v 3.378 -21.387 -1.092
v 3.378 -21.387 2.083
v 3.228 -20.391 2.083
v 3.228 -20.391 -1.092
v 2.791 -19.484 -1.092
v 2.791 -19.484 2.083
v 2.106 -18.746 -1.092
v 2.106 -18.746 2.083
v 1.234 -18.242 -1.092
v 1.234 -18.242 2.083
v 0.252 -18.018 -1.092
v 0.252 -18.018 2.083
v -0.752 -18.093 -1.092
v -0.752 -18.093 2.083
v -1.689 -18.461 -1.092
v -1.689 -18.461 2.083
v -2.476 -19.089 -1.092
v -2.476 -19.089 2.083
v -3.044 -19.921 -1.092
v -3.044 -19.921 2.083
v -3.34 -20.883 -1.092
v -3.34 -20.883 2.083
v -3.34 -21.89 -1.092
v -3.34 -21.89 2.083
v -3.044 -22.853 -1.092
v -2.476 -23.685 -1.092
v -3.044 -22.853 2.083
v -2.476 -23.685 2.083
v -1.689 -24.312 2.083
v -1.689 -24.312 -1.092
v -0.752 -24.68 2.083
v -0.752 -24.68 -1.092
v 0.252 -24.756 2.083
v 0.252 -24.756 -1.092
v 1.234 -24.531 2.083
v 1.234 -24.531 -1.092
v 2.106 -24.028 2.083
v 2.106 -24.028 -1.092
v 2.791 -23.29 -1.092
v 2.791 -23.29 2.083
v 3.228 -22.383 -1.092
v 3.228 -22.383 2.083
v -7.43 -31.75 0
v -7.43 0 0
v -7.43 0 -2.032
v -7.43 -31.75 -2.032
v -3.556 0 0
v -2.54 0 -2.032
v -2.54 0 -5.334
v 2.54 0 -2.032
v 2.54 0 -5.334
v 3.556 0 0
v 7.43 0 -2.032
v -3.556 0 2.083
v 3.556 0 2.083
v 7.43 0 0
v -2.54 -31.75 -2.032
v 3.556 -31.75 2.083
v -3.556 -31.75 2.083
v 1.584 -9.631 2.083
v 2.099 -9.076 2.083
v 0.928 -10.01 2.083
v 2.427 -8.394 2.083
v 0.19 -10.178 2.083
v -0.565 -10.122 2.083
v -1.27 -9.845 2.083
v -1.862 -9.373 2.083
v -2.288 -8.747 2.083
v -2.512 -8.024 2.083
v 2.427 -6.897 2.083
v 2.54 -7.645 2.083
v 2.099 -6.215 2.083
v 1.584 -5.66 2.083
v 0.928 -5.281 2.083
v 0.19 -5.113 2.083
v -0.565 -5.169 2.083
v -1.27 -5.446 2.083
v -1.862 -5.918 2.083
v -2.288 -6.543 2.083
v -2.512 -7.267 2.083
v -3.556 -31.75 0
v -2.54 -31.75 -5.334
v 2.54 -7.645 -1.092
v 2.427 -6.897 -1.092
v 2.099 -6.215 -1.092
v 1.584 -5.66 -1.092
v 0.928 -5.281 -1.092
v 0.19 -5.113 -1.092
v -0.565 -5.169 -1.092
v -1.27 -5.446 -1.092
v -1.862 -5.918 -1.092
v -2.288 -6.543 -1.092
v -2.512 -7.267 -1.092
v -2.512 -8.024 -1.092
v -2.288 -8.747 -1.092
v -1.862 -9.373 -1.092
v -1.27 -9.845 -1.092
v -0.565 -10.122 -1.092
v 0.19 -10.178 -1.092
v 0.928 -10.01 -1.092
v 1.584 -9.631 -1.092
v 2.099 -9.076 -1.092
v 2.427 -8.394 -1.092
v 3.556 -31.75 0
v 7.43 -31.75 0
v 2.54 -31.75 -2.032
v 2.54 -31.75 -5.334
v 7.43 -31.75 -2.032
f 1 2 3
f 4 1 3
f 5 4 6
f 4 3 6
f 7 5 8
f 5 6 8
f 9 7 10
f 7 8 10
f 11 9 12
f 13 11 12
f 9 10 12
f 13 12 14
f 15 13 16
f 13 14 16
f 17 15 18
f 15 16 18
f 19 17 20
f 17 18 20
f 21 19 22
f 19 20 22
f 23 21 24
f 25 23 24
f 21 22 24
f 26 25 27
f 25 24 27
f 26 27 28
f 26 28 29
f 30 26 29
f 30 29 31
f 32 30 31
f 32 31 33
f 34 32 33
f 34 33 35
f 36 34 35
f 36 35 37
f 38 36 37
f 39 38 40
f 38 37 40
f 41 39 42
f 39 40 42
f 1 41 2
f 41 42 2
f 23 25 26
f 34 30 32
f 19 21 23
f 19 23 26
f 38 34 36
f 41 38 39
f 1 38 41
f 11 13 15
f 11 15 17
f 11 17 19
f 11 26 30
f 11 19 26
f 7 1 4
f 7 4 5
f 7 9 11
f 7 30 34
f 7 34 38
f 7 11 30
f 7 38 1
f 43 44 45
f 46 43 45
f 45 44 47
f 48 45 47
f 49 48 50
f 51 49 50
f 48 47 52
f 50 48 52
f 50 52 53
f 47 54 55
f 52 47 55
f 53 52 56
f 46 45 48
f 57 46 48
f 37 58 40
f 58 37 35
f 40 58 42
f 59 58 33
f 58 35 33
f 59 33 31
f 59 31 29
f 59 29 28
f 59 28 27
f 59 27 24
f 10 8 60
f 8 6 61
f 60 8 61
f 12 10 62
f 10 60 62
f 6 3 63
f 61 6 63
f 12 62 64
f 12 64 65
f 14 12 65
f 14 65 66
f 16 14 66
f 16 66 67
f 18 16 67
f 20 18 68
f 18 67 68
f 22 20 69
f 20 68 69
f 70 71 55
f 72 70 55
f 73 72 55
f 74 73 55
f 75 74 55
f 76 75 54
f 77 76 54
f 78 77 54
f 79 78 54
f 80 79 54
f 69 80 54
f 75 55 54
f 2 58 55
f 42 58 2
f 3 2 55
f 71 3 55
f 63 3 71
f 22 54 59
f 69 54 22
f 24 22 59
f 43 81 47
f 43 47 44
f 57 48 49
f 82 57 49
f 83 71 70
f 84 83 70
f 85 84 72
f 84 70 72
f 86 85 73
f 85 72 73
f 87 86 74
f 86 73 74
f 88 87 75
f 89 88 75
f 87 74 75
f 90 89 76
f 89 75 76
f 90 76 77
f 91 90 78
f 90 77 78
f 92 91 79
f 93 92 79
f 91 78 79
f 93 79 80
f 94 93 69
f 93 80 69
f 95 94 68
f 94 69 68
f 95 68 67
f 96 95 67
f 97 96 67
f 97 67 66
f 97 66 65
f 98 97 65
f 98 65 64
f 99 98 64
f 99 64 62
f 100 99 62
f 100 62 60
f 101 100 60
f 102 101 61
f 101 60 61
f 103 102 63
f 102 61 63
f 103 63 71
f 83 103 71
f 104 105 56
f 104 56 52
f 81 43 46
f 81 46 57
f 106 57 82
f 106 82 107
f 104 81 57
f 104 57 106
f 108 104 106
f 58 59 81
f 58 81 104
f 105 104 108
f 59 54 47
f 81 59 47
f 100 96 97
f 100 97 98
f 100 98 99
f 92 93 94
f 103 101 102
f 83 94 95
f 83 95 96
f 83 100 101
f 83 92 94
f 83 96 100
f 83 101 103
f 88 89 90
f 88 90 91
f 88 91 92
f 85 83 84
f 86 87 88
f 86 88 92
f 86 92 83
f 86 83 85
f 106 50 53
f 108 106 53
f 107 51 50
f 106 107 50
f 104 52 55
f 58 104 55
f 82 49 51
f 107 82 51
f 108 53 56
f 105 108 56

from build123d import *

# Parameters (mm, degrees)
F1_DEPTH = 31.75
F2_R     = 3.3782
F2_R_2   = 2.54
F3_DEPTH = 3.175


# Not quite as in the source:
# - a feature names something its author has since deleted; it is built from what else it names


with BuildPart() as f1:
    # F0 (on Front) → F1 (new body)
    with BuildSketch(Plane.XZ):
        Polygon((3.556, 2.0828), (-3.556, 2.0828), (-3.556, 0), (-7.4295, 0), (-7.4295, -2.032), (-2.54, -2.032), (-2.54, -5.334), (2.54, -5.334), (2.54, -2.032), (7.4295, -2.032), (7.4295, 0), (3.556, 0), align=None)
    extrude(amount=F1_DEPTH)

    # F2 (on face) → F3 (cut)
    with BuildSketch(Plane.XY.offset(2.0828)):
        with Locations((0, -21.3868)):
            Circle(F2_R)
        with Locations((0, -7.6454)):
            Circle(F2_R_2)
    extrude(amount=-F3_DEPTH, mode=Mode.SUBTRACT)


solid = f1.part
